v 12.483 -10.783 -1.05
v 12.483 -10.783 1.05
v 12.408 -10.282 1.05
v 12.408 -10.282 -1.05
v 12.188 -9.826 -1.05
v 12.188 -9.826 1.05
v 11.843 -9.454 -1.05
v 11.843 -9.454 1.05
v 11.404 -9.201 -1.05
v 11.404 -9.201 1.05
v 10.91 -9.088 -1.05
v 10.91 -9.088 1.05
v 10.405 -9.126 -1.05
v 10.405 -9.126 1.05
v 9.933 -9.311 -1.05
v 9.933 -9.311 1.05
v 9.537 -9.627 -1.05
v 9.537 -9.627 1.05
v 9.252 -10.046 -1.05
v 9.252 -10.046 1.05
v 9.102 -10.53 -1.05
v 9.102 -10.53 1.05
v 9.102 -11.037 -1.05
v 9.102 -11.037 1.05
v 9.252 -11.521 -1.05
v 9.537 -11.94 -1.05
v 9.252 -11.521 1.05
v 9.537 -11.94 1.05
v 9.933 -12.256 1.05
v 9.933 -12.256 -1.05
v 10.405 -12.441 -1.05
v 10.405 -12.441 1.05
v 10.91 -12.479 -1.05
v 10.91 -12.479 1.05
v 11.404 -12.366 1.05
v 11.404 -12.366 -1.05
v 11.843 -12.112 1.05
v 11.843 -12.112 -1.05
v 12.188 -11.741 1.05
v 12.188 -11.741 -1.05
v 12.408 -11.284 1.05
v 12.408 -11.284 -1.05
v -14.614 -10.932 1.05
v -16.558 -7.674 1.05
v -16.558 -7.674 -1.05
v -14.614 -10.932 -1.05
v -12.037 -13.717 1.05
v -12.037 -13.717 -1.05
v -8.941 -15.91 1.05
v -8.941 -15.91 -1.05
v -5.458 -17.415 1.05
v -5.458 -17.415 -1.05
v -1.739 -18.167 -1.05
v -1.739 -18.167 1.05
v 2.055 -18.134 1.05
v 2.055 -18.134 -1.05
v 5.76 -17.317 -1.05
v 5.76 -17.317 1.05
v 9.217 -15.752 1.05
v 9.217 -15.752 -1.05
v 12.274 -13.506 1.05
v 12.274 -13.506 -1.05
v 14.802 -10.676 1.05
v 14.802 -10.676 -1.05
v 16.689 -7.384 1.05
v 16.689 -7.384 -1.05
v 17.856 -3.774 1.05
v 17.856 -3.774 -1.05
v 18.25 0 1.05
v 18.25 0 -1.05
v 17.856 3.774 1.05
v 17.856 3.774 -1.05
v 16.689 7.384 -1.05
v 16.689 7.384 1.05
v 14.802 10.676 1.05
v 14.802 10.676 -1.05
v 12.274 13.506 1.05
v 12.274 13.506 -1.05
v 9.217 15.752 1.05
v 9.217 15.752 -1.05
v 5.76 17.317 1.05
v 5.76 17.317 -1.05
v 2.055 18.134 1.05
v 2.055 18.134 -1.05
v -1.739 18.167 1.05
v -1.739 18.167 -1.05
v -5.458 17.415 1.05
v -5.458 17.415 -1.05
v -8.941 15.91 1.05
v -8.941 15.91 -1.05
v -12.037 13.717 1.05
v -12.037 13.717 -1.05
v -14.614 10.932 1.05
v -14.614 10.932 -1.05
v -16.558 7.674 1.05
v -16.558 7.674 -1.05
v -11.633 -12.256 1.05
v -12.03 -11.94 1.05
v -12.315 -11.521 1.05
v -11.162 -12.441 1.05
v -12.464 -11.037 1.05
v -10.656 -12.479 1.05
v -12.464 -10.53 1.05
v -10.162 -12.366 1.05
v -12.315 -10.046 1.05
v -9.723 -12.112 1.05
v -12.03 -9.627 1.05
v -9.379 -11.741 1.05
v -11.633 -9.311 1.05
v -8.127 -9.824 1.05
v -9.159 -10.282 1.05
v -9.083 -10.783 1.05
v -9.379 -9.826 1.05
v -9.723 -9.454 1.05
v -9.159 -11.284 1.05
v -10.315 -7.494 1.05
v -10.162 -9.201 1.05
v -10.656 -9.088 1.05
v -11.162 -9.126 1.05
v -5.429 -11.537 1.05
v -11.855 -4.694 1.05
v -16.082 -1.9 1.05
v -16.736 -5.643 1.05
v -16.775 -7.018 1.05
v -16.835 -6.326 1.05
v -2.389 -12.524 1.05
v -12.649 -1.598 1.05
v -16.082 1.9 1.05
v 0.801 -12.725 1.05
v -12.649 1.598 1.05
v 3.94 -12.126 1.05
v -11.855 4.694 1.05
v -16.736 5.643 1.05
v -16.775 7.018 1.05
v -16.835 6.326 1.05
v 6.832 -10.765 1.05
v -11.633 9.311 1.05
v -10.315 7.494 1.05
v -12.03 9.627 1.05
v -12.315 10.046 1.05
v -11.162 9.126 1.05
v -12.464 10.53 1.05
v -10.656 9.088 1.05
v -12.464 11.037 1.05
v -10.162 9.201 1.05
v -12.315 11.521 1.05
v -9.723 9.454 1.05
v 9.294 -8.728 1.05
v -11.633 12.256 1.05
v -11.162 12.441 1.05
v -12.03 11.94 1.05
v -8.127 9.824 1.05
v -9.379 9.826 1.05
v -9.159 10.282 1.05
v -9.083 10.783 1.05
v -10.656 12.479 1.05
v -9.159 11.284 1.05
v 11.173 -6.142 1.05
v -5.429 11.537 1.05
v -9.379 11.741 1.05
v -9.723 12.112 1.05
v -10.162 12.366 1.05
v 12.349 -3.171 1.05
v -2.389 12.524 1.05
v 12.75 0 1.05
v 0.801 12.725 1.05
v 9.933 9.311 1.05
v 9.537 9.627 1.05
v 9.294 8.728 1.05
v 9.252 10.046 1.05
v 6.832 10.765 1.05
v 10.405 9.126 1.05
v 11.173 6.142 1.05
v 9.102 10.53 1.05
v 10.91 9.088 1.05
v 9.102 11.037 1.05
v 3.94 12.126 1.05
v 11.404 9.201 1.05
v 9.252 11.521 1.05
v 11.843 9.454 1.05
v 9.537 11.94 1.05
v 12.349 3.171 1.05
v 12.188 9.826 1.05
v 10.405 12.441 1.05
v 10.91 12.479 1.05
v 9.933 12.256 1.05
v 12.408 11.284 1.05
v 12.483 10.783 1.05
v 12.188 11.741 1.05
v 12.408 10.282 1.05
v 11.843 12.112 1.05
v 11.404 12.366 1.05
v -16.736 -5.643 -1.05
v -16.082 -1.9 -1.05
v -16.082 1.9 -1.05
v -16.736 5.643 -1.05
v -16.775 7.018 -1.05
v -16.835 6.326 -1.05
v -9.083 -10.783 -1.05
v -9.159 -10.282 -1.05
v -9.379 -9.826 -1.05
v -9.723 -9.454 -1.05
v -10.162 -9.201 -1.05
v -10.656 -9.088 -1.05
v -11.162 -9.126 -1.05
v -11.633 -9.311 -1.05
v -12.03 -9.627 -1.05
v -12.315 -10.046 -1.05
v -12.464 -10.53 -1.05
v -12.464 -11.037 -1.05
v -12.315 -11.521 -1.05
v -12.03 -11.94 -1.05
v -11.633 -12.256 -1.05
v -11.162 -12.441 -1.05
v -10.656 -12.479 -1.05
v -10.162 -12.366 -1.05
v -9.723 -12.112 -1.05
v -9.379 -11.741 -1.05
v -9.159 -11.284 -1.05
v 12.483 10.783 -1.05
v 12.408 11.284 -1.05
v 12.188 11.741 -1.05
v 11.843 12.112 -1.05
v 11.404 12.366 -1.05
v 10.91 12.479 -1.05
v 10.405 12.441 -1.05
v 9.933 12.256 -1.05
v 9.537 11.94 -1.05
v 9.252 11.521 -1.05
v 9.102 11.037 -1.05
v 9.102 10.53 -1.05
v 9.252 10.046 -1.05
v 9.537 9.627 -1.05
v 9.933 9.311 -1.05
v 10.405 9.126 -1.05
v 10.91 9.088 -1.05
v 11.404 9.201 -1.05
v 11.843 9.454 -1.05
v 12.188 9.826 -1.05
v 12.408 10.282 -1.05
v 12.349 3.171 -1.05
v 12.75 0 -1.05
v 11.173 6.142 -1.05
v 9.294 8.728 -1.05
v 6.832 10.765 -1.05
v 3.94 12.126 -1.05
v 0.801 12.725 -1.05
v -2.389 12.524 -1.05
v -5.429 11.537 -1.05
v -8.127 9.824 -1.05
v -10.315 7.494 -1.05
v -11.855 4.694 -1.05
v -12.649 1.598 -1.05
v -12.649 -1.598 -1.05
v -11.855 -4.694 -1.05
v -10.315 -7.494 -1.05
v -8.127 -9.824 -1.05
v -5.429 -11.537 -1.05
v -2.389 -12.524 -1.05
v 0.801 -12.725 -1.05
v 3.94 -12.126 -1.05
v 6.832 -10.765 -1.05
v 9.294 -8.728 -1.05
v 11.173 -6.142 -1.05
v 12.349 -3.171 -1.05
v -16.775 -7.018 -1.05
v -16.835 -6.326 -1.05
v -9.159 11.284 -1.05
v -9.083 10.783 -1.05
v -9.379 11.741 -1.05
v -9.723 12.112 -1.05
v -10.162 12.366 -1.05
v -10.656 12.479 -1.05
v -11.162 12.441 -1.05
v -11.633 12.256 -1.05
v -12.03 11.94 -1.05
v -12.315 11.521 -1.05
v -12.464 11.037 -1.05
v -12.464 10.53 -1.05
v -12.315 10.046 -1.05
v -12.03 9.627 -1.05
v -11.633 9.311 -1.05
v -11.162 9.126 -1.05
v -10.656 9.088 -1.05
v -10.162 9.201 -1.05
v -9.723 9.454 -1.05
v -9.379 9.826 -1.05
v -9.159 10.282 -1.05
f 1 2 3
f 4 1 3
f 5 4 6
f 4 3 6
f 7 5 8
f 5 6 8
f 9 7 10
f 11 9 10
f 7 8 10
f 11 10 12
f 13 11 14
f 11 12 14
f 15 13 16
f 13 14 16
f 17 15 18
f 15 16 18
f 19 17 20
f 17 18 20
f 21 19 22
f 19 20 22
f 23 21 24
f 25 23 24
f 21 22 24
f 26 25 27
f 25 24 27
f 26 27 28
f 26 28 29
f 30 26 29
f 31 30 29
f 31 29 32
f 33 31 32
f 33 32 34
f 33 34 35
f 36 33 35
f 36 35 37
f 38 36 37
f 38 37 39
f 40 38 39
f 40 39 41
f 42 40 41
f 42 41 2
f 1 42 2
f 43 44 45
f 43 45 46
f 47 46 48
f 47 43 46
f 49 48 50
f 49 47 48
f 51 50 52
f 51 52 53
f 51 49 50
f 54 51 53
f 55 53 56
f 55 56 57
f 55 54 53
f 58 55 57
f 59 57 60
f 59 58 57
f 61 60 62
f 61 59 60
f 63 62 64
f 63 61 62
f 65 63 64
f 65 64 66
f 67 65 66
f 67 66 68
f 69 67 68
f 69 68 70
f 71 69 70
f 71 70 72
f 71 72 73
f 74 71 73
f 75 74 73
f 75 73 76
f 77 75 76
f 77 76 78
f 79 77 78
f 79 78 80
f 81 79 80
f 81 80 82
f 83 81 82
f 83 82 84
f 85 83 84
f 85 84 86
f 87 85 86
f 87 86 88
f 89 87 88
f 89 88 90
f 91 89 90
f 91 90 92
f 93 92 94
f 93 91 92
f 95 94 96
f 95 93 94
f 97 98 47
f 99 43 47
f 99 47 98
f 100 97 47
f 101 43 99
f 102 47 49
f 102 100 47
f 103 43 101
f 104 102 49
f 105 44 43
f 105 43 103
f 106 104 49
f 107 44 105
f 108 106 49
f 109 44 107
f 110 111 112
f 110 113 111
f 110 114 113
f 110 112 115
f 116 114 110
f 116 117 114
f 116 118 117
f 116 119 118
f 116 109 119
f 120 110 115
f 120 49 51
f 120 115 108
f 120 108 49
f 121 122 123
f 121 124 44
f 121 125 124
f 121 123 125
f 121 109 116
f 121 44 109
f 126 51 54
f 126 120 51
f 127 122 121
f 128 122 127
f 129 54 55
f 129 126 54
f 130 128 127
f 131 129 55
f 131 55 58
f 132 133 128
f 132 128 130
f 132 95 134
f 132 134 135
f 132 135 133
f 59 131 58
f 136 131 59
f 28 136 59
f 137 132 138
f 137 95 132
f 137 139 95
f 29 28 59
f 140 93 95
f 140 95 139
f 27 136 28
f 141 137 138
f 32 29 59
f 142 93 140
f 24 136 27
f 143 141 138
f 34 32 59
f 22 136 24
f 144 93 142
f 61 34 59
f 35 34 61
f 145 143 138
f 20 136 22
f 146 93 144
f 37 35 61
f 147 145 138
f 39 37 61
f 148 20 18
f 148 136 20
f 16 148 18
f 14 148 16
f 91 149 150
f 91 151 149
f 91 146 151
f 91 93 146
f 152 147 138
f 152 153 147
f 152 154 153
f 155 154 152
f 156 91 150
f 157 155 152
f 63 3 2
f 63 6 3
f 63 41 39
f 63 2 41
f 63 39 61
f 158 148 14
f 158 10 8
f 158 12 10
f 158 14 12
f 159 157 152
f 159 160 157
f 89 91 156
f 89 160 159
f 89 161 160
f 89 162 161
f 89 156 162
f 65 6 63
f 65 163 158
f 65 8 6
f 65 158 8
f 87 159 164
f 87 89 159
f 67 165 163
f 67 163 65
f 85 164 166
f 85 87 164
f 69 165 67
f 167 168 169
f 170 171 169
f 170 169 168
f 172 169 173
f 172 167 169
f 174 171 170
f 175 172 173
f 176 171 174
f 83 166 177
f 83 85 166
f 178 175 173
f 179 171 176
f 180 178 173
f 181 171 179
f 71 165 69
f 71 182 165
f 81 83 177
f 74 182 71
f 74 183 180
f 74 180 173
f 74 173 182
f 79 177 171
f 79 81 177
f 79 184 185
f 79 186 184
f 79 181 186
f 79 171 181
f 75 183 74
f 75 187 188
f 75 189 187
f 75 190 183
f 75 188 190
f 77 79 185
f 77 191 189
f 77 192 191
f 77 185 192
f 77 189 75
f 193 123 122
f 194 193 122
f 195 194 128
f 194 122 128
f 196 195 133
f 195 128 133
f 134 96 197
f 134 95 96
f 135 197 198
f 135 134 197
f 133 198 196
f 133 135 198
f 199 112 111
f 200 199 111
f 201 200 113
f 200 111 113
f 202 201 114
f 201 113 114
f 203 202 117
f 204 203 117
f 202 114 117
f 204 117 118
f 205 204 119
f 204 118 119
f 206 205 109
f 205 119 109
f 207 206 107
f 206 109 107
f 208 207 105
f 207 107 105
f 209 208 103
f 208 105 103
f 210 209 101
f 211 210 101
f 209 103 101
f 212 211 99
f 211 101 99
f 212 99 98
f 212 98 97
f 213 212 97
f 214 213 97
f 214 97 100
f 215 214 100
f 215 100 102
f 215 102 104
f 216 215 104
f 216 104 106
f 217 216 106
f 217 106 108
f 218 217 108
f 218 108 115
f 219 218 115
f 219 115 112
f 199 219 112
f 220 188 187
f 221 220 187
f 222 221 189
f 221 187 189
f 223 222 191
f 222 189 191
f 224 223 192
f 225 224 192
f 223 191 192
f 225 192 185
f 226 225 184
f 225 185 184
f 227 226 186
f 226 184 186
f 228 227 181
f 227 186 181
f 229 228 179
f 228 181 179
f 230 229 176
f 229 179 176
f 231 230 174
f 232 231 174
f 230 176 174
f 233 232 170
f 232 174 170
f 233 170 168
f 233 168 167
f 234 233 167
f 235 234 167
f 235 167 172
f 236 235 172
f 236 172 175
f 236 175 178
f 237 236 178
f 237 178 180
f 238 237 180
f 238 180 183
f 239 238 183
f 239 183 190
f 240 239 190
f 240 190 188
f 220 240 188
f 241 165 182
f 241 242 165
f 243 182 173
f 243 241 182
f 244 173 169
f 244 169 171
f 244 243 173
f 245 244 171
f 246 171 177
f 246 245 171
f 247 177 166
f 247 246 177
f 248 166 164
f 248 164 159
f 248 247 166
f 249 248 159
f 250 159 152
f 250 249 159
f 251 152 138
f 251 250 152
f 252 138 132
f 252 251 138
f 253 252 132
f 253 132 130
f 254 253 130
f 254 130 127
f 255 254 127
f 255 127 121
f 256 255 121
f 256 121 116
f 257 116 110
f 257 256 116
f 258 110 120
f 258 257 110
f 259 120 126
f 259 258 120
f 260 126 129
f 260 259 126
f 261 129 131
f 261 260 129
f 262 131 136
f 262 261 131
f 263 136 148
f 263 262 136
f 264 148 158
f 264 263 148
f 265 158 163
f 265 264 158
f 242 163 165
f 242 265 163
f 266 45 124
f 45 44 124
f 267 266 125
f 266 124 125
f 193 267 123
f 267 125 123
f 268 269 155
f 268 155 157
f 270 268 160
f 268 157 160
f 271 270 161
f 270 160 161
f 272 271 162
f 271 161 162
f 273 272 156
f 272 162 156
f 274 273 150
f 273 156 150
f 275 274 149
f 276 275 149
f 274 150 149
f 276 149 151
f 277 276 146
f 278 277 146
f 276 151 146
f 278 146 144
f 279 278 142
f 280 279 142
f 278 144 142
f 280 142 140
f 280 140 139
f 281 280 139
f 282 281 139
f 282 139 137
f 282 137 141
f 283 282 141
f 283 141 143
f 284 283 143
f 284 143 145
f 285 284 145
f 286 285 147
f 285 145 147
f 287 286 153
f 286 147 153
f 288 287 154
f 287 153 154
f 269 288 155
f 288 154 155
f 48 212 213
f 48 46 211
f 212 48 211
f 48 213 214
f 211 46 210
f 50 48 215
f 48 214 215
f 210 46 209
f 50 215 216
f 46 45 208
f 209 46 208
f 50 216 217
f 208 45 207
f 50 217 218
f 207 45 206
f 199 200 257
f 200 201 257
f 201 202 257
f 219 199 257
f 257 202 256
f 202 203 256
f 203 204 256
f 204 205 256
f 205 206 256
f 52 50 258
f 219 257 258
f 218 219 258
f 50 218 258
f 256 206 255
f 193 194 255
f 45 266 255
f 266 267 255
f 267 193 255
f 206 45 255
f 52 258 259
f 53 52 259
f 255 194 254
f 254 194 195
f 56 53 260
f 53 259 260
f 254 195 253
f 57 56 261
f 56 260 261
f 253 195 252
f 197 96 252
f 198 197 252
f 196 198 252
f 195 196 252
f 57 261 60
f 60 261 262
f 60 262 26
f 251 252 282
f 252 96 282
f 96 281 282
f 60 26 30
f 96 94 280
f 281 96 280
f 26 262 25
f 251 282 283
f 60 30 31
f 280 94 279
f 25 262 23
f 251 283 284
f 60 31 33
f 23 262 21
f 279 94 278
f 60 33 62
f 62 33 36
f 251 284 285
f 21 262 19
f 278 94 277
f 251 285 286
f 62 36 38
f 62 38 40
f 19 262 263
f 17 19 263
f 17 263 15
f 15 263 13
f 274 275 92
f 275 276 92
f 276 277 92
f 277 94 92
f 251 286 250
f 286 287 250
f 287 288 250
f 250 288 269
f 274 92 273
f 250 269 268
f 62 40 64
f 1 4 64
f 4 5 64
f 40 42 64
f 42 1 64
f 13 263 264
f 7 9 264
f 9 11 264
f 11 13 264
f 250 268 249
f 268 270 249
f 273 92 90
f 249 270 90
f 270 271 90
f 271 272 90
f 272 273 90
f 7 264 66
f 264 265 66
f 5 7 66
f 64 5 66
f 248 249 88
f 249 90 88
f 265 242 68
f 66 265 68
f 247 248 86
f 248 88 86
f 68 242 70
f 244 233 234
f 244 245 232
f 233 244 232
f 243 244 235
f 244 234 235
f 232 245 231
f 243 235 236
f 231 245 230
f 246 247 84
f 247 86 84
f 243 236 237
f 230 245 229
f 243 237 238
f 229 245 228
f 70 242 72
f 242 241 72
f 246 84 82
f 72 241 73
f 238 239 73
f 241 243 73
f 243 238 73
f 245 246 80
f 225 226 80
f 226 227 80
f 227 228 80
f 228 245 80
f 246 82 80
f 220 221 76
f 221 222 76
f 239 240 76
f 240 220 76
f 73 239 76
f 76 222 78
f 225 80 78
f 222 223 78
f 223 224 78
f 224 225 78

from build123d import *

# Parameters (mm, degrees)
SKETCH_1_R          = 18.25
SKETCH_1_R_2        = 12.75
EXTRUDE_1_DEPTH     = 1.05
SKETCH_2_R          = 22
CUT_EXTRUDE_1_DEPTH = 21.05
SKETCH_3_R          = 1.7
CUT_EXTRUDE_2_DEPTH = 16.05
FILLET_1_R          = 3


with BuildPart() as part:
    # 草图1 → 凸台-拉伸1 (new, symmetric)
    with BuildSketch(Plane.XY):
        Circle(SKETCH_1_R)
        Circle(SKETCH_1_R_2, mode=Mode.SUBTRACT)
    extrude(amount=EXTRUDE_1_DEPTH, both=True)

    # 草图2 → 切除-拉伸1 (cut, symmetric)
    with BuildSketch(Plane.XY.offset(1.05)):
        with Locations((-38, 0)):
            Circle(SKETCH_2_R)
    extrude(amount=CUT_EXTRUDE_1_DEPTH, both=True, mode=Mode.SUBTRACT)

    # 草图3 → 切除-拉伸2 (cut, symmetric)
    with BuildSketch(Plane.XY.offset(1.05)):
        with Locations((10.783378413, 10.783378413)):
            Circle(SKETCH_3_R)
        with Locations((10.783378413, -10.783378413)):
            Circle(SKETCH_3_R)
        with Locations((-10.783378413, -10.783378413)):
            Circle(SKETCH_3_R)
        with Locations((-10.783378413, 10.783378413)):
            Circle(SKETCH_3_R)
    extrude(amount=CUT_EXTRUDE_2_DEPTH, both=True, mode=Mode.SUBTRACT)

    # 圆角1
    fillet_1_edges = [part.edges().sort_by_distance(p)[0] for p in [
        (-17.013980263, -6.60204329, 0),
        (-17.013980263, 6.60204329, 0),
    ]]
    fillet(fillet_1_edges, radius=FILLET_1_R)


solid = part.part
